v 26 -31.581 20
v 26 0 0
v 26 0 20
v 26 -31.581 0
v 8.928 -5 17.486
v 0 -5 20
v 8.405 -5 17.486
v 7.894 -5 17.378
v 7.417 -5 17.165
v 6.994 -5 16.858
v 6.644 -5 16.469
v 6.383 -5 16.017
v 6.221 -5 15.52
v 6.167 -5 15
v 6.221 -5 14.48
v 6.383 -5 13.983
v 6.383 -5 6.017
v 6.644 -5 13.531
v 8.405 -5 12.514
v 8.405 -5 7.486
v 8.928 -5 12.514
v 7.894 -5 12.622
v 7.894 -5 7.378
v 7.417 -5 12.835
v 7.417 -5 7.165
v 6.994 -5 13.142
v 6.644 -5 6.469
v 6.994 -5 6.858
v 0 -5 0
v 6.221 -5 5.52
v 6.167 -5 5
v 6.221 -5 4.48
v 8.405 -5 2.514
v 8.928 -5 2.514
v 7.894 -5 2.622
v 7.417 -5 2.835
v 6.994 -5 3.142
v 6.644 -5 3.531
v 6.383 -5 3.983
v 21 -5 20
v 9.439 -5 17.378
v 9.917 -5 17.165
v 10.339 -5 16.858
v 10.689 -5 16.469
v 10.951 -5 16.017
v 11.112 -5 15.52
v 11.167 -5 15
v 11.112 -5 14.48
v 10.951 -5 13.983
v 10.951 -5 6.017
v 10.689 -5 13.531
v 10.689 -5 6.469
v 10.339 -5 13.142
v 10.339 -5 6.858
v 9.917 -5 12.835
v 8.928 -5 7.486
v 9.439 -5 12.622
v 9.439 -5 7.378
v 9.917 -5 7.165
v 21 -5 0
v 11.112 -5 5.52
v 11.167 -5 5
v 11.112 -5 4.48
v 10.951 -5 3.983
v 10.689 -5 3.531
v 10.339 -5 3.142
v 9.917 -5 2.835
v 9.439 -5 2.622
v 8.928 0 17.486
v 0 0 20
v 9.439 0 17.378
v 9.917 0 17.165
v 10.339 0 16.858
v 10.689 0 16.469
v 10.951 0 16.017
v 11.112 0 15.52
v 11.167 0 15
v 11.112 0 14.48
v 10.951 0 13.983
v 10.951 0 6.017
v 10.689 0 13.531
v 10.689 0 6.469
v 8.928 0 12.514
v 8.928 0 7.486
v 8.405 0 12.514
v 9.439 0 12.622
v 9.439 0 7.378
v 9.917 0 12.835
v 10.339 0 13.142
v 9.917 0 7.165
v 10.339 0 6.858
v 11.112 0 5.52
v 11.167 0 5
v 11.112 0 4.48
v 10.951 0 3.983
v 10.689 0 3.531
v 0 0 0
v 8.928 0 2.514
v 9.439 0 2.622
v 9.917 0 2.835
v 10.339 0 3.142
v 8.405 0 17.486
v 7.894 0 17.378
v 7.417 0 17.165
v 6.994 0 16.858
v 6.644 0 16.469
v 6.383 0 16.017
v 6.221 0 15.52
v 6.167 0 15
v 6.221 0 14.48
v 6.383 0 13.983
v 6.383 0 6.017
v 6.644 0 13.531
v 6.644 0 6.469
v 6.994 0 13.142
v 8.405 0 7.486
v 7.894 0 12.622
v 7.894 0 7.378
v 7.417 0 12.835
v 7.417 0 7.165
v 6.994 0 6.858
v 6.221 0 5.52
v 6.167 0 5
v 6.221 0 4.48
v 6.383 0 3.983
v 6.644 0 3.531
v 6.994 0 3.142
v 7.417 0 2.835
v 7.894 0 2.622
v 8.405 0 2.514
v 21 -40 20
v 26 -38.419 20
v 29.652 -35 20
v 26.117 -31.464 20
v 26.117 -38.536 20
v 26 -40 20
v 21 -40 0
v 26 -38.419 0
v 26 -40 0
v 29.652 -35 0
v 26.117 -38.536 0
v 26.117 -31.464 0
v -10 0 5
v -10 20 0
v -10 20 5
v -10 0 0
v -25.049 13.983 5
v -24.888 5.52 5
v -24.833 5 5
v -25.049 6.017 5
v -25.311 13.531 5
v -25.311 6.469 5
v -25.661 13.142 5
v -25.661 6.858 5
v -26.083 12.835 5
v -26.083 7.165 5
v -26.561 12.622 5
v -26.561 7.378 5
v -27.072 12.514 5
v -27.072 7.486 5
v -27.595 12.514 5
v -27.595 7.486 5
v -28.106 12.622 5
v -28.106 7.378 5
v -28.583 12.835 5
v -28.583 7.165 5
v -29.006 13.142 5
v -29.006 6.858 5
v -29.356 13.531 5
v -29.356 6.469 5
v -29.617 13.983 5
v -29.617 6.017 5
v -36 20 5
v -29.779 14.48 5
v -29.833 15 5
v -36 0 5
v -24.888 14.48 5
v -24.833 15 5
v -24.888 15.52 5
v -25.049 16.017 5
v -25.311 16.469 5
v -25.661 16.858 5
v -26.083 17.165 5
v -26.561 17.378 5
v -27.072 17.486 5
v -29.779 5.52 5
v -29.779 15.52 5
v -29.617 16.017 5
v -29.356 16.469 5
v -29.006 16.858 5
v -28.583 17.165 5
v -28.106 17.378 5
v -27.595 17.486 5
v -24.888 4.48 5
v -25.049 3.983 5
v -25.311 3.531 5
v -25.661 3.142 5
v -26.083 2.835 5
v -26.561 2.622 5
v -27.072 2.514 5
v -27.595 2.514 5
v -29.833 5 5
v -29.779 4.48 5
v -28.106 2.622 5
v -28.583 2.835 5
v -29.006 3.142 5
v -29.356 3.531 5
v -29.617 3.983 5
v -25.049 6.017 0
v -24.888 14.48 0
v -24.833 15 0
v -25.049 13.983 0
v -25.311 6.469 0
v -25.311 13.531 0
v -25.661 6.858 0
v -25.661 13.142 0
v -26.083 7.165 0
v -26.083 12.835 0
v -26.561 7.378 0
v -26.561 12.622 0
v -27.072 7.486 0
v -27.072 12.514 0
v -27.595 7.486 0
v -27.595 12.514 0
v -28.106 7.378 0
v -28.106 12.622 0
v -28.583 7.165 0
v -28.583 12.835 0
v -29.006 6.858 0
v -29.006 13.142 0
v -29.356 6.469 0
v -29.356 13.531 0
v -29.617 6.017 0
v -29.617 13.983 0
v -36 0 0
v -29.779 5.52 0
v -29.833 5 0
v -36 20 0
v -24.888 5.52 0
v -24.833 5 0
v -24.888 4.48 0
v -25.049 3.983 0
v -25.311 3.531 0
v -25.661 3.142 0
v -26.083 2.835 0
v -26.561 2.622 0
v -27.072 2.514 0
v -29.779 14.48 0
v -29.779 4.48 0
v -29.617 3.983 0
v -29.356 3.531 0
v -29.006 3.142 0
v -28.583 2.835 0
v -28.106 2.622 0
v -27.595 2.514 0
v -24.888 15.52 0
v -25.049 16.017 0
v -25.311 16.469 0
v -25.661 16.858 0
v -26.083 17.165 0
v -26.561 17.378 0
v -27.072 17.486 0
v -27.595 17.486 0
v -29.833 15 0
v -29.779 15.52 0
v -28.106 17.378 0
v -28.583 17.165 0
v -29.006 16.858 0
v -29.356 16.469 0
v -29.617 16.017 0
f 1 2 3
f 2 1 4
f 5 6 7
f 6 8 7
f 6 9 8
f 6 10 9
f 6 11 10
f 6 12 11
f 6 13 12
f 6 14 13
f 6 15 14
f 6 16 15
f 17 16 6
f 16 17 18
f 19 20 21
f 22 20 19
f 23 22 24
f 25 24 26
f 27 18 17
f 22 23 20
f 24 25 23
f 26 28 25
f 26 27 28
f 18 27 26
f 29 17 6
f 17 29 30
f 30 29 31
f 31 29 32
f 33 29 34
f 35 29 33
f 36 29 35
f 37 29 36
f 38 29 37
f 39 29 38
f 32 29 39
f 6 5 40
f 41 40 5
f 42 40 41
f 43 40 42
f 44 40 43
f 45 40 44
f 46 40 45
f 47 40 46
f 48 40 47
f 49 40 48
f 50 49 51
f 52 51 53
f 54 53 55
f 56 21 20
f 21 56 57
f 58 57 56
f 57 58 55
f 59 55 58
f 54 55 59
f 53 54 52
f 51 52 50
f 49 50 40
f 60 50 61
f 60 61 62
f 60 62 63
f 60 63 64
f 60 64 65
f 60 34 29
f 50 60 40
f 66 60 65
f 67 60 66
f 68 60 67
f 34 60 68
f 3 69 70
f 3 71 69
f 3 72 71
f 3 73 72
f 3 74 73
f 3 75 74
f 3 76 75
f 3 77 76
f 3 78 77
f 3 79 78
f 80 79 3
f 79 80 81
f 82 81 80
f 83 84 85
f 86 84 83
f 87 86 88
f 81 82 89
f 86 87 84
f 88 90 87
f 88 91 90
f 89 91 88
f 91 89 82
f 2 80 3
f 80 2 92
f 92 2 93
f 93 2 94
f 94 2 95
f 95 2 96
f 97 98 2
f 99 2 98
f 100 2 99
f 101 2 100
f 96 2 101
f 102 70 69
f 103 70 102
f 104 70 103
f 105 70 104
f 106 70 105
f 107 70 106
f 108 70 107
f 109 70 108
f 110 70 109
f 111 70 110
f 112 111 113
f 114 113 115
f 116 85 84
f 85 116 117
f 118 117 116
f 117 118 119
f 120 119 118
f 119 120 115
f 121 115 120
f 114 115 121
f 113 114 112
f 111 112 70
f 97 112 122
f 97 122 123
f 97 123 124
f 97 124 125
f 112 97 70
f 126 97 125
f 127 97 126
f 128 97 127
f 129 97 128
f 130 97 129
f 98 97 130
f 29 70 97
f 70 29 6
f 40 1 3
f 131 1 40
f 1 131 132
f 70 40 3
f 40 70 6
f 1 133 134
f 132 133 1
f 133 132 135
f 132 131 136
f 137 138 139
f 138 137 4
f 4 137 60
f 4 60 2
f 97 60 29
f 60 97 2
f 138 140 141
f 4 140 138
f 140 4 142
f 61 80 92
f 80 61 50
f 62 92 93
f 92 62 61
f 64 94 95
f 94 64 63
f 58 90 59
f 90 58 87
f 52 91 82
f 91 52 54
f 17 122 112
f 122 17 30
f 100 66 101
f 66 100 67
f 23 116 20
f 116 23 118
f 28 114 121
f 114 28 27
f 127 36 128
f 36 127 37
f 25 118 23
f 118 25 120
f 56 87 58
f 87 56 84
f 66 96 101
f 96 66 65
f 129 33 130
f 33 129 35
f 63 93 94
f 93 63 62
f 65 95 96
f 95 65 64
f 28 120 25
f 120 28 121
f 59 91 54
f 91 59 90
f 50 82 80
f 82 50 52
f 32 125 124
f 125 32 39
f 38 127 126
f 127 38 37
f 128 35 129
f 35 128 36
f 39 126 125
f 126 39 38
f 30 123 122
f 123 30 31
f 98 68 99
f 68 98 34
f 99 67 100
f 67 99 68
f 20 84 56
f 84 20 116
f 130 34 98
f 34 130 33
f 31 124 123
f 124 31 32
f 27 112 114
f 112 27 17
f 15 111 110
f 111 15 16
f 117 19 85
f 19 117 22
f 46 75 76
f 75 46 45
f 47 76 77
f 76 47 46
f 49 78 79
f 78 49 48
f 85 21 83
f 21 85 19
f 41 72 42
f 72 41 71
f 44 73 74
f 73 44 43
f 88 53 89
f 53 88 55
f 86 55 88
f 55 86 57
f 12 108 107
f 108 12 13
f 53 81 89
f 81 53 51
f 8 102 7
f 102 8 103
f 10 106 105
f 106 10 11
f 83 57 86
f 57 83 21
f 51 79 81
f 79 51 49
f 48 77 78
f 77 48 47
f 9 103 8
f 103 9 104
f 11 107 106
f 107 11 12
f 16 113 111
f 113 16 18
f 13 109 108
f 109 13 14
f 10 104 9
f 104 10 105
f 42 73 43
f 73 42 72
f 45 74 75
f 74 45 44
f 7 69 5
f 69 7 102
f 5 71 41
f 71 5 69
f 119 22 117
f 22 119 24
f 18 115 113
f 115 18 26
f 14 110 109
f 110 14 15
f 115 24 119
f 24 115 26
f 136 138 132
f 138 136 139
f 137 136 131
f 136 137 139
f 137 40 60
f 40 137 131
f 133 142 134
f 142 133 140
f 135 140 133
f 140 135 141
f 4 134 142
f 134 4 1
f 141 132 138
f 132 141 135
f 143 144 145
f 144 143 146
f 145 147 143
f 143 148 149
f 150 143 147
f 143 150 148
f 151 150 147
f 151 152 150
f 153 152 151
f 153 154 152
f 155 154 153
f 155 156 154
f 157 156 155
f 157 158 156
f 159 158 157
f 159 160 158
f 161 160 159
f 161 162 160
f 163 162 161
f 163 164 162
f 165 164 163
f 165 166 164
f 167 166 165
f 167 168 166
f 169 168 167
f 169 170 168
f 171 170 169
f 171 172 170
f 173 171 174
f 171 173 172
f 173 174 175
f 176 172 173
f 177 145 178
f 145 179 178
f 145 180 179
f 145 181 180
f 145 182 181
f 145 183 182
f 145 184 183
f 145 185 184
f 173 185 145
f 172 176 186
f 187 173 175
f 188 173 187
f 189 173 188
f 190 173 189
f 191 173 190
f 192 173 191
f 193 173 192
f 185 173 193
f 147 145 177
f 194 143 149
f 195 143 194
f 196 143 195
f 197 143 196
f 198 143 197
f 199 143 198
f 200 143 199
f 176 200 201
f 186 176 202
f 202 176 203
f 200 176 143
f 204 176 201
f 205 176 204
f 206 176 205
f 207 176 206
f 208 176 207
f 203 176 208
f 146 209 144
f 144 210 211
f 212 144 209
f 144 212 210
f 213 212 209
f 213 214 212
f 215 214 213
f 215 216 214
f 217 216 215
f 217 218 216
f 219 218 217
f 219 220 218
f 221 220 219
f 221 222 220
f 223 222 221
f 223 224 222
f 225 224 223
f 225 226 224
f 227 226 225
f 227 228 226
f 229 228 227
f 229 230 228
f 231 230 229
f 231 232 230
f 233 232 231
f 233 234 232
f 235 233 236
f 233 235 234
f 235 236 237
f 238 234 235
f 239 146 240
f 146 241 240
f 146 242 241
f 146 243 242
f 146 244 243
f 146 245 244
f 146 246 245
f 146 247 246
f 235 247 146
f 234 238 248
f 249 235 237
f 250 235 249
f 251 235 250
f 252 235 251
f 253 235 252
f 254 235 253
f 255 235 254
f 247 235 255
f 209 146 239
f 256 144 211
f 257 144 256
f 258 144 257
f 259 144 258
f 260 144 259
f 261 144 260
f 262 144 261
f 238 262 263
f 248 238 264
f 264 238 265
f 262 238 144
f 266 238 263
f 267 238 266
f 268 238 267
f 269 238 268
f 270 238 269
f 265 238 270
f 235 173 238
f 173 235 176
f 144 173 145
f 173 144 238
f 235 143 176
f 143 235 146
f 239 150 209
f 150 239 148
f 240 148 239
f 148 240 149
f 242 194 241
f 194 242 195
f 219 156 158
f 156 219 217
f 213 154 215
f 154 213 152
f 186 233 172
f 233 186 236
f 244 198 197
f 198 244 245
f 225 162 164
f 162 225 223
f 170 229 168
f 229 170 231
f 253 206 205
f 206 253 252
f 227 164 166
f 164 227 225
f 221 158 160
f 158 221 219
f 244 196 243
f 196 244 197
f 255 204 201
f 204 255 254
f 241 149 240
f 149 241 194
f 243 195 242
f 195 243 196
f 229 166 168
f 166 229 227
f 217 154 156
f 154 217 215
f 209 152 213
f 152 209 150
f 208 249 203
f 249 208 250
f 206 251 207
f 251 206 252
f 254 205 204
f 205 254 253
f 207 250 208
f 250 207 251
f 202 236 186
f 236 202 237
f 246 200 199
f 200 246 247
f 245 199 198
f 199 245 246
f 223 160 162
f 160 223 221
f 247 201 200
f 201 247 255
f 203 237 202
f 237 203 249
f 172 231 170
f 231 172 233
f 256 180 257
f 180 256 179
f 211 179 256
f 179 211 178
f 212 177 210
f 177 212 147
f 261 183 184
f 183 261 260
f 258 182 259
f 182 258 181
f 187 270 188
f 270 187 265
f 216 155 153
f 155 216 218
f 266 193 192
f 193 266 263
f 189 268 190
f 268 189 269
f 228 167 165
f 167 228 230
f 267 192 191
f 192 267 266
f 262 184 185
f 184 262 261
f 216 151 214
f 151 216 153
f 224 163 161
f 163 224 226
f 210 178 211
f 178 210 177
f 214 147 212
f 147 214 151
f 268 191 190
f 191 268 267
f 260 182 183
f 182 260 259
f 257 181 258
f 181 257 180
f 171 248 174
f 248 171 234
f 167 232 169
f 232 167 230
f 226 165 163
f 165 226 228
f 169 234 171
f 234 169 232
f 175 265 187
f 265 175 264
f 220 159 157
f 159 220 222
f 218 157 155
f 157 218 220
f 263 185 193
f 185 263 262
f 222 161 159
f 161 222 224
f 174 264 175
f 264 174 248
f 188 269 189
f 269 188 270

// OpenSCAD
$fn=30;
length=40;
a1=20;
a2=26;
thick=5;
hole=5; //mounting holes diameter

//hook
rotate([90,0,0]) {
    //mounting plate
    difference() {
        cube([a2,a1,thick]);
        translate([a2/3,hole,-thick/4])
        cylinder(thick*2,hole/2,hole/2);
        translate([a2/3,a1-hole,-thick/4])
        cylinder(thick*2,hole/2,hole/2);
    }
    //up
    translate([a2-thick,0,0]) {
        cube([thick,a1,length]);
        //edge
        movex=sqrt(2*thick)/2;
        translate([movex,0,length-thick]) {
            rotate([0,45,0]) {
                cube([thick,a1,thick]);
            }
        }
    }
}


//retaining plate
translate([-a2-10,0,0]) {
    difference() {
        cube([a2,a1,thick]);
        translate([a2/3,hole,-2])
        cylinder(thick*2,hole/2,hole/2);
        translate([a2/3,a1-hole,-2])
        cylinder(thick*2,hole/2,hole/2);
    }
}

